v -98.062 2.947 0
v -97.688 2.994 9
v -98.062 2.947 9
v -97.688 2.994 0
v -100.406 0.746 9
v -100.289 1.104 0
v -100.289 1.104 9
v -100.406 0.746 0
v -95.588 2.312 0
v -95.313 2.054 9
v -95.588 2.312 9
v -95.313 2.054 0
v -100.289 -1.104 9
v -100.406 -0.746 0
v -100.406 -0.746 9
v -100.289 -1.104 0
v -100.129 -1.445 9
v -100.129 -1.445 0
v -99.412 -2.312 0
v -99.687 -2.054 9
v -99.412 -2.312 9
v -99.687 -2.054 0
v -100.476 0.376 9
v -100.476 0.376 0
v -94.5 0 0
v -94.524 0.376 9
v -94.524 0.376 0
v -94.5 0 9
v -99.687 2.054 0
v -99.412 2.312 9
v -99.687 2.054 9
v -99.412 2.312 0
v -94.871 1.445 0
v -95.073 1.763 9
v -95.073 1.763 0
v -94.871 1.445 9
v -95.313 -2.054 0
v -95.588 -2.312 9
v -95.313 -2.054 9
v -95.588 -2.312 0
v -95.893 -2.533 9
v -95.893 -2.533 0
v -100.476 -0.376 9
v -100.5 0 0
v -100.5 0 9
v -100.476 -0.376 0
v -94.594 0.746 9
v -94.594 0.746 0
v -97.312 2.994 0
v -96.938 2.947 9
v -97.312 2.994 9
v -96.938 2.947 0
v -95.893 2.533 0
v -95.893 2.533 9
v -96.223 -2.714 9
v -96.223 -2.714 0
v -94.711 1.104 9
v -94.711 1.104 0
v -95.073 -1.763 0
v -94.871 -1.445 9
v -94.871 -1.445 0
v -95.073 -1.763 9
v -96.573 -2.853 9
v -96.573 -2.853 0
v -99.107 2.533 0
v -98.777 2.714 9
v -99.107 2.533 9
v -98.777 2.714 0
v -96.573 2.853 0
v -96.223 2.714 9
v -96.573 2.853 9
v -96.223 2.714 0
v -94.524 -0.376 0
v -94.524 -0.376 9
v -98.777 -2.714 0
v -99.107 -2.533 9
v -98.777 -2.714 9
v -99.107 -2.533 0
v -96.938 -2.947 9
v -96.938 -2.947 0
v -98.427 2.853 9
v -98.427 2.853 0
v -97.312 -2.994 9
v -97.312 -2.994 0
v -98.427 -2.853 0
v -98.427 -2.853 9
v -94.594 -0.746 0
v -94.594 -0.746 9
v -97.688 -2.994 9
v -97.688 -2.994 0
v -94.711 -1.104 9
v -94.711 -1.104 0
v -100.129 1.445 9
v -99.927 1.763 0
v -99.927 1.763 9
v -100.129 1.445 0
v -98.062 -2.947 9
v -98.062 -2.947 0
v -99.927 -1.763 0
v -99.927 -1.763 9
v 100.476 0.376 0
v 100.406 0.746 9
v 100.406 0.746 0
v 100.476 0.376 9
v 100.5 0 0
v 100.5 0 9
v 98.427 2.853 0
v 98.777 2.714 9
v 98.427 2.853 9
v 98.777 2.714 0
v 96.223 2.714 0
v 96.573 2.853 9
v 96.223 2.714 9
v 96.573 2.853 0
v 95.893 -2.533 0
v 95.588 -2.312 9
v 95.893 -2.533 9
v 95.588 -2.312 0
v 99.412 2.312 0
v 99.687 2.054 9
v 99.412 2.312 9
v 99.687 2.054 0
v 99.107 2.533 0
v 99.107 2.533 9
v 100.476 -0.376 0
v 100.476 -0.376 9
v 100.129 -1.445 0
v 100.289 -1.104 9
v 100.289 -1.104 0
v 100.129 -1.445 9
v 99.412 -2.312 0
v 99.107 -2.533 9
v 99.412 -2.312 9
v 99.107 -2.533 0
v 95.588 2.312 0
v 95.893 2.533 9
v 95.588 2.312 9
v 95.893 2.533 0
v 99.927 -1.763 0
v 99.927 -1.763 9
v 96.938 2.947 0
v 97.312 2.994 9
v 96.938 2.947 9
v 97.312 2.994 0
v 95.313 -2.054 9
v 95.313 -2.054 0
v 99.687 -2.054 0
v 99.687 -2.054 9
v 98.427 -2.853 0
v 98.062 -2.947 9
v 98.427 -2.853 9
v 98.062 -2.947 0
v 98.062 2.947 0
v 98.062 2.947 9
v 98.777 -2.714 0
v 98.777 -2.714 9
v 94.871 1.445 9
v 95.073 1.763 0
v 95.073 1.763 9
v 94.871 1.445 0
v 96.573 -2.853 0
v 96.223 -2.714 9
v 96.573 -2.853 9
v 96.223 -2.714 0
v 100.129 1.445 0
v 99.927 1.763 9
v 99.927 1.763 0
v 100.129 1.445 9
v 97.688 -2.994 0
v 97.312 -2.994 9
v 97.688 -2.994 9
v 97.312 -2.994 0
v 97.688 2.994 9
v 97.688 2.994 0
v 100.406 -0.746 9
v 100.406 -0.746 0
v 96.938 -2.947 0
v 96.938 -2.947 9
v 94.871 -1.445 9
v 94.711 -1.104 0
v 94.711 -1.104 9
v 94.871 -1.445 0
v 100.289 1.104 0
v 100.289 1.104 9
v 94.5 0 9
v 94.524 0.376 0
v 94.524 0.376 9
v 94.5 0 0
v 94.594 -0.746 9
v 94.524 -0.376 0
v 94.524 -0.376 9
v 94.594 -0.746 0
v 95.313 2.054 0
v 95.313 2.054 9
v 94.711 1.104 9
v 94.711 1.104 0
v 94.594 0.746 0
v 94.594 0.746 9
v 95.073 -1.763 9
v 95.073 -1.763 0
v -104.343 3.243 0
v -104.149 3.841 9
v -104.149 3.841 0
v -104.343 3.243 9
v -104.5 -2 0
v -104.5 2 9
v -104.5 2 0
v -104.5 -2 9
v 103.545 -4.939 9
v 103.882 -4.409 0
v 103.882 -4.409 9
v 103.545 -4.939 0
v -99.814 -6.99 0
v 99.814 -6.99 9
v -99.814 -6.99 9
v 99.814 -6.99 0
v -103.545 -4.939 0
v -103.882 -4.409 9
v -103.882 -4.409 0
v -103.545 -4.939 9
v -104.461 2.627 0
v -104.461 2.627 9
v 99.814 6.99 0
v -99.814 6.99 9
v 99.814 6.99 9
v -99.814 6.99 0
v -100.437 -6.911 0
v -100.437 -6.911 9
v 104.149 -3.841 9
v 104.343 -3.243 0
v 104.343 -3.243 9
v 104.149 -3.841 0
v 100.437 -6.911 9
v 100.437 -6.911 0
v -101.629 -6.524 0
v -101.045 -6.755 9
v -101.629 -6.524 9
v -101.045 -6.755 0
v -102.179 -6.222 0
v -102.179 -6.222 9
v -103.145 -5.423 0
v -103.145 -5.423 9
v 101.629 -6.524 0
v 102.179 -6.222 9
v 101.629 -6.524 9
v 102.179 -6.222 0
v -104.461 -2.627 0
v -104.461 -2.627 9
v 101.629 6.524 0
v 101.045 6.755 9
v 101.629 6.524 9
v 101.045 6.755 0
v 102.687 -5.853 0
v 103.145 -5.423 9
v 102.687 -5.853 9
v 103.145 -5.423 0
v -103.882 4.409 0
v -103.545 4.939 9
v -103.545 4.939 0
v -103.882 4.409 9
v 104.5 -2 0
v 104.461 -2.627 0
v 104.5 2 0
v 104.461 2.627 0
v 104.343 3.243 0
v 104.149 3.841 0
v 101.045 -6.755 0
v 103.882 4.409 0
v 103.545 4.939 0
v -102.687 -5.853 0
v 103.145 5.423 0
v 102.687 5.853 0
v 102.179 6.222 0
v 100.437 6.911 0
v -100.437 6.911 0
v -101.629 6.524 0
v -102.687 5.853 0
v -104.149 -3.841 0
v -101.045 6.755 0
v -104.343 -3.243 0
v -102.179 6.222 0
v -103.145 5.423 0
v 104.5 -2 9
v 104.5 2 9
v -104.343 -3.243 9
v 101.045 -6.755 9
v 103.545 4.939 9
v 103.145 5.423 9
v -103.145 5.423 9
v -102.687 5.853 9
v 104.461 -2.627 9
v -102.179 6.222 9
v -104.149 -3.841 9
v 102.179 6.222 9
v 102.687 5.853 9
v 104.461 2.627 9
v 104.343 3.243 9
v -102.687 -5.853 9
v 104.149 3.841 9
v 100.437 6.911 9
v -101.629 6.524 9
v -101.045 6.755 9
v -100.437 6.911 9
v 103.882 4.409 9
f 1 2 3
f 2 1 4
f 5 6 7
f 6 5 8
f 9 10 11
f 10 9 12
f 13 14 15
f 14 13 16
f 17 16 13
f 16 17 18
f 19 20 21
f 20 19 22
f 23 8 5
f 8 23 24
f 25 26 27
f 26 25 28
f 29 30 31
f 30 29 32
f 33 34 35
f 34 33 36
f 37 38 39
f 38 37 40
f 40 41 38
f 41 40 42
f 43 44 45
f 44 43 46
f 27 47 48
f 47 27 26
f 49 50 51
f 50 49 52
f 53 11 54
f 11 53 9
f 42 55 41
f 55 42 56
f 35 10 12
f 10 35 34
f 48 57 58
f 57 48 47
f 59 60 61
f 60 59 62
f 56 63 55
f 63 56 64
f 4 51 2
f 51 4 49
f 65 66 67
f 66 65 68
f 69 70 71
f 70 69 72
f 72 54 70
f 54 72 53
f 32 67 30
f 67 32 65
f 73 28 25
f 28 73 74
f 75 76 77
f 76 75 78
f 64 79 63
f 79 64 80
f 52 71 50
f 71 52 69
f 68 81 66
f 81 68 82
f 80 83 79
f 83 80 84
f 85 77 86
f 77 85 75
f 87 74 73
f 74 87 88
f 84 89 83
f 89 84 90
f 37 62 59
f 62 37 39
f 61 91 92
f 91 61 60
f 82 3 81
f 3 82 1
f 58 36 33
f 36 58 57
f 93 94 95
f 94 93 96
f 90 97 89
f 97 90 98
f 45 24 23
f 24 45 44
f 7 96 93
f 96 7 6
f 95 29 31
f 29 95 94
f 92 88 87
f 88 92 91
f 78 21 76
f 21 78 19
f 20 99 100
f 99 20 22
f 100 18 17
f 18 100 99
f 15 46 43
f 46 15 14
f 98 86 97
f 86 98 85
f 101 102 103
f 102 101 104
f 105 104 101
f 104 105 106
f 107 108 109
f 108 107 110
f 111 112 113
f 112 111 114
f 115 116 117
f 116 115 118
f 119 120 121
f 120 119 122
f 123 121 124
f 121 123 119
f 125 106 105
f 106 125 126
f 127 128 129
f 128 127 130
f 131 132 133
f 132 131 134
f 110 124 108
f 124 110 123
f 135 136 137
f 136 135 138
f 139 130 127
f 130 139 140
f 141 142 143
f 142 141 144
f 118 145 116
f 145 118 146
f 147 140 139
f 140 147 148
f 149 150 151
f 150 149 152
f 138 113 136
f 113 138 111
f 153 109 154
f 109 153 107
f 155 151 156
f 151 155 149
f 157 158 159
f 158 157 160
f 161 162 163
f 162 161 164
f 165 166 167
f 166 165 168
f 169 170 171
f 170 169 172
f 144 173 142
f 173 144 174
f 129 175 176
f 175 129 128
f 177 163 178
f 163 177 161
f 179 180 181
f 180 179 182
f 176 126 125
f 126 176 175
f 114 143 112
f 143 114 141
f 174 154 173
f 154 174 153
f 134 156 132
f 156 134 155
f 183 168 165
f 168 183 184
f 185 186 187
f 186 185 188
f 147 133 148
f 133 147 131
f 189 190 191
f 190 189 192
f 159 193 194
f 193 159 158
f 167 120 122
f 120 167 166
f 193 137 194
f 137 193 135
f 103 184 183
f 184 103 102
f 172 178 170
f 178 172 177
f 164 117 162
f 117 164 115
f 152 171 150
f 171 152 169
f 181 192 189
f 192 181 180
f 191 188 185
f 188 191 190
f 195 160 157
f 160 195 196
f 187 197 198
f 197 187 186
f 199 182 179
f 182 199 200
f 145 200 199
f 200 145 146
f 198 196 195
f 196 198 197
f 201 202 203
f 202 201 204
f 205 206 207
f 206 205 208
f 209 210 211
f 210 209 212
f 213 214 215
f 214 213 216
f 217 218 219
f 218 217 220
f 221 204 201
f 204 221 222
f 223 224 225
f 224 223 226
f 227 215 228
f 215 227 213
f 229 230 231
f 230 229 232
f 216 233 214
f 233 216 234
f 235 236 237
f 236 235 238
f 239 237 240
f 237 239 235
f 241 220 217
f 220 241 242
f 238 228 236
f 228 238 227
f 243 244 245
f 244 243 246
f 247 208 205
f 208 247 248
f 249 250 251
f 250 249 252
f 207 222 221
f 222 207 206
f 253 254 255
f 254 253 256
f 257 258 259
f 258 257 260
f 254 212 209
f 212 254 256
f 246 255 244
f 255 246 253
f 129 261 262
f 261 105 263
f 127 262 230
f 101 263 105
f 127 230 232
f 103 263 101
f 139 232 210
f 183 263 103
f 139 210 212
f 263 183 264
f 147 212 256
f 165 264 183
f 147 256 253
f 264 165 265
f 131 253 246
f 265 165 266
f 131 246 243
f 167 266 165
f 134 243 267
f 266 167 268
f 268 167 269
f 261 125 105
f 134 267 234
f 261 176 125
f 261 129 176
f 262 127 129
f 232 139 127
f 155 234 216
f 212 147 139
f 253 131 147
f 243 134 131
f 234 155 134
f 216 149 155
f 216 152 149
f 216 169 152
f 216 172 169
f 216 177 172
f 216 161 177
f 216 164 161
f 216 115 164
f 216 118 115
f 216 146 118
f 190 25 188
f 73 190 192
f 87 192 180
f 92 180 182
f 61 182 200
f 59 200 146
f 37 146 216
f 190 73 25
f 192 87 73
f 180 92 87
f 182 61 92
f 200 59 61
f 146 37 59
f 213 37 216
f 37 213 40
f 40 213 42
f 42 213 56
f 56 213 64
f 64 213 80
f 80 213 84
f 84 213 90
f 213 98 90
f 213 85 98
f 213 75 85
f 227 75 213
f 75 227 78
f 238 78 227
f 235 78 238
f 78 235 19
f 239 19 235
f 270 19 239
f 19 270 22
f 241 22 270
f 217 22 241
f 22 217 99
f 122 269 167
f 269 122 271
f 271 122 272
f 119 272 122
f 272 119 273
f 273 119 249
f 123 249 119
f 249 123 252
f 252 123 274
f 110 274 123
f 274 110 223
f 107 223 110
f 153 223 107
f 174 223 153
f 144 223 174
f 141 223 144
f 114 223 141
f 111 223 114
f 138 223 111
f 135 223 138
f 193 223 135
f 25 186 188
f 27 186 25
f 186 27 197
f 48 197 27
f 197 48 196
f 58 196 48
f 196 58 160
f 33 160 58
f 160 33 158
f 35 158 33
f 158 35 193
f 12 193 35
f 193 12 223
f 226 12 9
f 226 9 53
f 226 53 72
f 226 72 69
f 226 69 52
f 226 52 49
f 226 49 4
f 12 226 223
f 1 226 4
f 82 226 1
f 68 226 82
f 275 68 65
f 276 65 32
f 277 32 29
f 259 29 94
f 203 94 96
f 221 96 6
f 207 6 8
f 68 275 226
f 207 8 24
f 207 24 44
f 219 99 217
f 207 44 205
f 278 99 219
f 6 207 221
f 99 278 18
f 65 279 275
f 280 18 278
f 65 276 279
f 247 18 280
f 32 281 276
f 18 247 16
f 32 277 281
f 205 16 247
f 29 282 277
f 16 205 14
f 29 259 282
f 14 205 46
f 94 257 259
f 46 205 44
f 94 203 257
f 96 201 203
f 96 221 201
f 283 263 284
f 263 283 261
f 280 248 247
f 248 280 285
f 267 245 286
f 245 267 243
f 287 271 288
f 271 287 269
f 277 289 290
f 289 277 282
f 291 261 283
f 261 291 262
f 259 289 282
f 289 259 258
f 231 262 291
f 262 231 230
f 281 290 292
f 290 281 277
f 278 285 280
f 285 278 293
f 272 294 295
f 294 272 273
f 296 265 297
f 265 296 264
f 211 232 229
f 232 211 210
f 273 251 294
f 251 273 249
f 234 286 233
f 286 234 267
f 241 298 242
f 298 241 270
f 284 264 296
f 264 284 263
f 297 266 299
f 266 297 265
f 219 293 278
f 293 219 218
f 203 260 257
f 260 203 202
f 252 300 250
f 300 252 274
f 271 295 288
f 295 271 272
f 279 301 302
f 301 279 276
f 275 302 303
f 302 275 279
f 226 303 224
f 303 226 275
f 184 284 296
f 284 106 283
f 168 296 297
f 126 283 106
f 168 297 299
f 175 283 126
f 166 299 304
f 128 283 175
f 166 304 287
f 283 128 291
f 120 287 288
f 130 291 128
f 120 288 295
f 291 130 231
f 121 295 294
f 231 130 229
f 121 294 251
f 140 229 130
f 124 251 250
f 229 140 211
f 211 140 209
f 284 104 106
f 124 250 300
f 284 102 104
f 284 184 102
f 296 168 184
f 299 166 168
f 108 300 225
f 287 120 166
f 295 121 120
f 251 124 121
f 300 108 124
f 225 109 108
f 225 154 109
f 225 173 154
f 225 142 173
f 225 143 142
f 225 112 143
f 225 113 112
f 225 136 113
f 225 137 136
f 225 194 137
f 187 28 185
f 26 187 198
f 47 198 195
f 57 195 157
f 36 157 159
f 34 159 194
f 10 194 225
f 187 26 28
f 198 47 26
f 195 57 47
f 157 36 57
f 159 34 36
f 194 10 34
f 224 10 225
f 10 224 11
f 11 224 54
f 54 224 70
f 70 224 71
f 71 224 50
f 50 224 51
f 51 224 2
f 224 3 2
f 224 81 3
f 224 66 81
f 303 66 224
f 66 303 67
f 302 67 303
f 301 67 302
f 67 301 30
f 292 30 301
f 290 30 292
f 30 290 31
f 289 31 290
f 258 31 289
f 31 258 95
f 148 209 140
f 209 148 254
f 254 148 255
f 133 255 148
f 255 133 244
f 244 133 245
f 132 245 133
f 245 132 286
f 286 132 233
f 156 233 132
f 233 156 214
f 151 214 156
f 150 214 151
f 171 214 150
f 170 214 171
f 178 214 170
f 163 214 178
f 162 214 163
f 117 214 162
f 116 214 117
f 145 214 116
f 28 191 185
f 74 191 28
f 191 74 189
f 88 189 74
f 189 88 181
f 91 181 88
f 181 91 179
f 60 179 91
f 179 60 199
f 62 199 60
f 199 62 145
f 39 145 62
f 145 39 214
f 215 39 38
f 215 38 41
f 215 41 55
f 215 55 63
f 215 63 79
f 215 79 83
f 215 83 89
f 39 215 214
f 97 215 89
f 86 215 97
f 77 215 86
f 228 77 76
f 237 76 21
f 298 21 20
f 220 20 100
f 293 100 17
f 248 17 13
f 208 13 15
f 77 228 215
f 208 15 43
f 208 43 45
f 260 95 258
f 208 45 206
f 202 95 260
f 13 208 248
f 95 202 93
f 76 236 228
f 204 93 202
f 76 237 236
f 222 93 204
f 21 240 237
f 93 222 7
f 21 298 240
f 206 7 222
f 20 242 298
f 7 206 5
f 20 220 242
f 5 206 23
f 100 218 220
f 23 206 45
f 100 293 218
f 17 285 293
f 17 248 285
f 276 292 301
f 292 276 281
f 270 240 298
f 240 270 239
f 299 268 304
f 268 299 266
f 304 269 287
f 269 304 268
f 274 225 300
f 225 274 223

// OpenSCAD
$fn = 50;


difference() {
	union() {
		hull() {
			translate(v = [-99.5000000000, 2.0000000000, 0]) {
				cylinder(h = 9, r = 5);
			}
			translate(v = [99.5000000000, 2.0000000000, 0]) {
				cylinder(h = 9, r = 5);
			}
			translate(v = [-99.5000000000, -2.0000000000, 0]) {
				cylinder(h = 9, r = 5);
			}
			translate(v = [99.5000000000, -2.0000000000, 0]) {
				cylinder(h = 9, r = 5);
			}
		}
	}
	union() {
		translate(v = [-97.5000000000, 0.0000000000, -100.0000000000]) {
			cylinder(h = 200, r = 3.0000000000);
		}
		translate(v = [-97.5000000000, 0.0000000000, -100.0000000000]) {
			cylinder(h = 200, r = 3.0000000000);
		}
		translate(v = [97.5000000000, 0.0000000000, -100.0000000000]) {
			cylinder(h = 200, r = 3.0000000000);
		}
		translate(v = [97.5000000000, 0.0000000000, -100.0000000000]) {
			cylinder(h = 200, r = 3.0000000000);
		}
	}
}
